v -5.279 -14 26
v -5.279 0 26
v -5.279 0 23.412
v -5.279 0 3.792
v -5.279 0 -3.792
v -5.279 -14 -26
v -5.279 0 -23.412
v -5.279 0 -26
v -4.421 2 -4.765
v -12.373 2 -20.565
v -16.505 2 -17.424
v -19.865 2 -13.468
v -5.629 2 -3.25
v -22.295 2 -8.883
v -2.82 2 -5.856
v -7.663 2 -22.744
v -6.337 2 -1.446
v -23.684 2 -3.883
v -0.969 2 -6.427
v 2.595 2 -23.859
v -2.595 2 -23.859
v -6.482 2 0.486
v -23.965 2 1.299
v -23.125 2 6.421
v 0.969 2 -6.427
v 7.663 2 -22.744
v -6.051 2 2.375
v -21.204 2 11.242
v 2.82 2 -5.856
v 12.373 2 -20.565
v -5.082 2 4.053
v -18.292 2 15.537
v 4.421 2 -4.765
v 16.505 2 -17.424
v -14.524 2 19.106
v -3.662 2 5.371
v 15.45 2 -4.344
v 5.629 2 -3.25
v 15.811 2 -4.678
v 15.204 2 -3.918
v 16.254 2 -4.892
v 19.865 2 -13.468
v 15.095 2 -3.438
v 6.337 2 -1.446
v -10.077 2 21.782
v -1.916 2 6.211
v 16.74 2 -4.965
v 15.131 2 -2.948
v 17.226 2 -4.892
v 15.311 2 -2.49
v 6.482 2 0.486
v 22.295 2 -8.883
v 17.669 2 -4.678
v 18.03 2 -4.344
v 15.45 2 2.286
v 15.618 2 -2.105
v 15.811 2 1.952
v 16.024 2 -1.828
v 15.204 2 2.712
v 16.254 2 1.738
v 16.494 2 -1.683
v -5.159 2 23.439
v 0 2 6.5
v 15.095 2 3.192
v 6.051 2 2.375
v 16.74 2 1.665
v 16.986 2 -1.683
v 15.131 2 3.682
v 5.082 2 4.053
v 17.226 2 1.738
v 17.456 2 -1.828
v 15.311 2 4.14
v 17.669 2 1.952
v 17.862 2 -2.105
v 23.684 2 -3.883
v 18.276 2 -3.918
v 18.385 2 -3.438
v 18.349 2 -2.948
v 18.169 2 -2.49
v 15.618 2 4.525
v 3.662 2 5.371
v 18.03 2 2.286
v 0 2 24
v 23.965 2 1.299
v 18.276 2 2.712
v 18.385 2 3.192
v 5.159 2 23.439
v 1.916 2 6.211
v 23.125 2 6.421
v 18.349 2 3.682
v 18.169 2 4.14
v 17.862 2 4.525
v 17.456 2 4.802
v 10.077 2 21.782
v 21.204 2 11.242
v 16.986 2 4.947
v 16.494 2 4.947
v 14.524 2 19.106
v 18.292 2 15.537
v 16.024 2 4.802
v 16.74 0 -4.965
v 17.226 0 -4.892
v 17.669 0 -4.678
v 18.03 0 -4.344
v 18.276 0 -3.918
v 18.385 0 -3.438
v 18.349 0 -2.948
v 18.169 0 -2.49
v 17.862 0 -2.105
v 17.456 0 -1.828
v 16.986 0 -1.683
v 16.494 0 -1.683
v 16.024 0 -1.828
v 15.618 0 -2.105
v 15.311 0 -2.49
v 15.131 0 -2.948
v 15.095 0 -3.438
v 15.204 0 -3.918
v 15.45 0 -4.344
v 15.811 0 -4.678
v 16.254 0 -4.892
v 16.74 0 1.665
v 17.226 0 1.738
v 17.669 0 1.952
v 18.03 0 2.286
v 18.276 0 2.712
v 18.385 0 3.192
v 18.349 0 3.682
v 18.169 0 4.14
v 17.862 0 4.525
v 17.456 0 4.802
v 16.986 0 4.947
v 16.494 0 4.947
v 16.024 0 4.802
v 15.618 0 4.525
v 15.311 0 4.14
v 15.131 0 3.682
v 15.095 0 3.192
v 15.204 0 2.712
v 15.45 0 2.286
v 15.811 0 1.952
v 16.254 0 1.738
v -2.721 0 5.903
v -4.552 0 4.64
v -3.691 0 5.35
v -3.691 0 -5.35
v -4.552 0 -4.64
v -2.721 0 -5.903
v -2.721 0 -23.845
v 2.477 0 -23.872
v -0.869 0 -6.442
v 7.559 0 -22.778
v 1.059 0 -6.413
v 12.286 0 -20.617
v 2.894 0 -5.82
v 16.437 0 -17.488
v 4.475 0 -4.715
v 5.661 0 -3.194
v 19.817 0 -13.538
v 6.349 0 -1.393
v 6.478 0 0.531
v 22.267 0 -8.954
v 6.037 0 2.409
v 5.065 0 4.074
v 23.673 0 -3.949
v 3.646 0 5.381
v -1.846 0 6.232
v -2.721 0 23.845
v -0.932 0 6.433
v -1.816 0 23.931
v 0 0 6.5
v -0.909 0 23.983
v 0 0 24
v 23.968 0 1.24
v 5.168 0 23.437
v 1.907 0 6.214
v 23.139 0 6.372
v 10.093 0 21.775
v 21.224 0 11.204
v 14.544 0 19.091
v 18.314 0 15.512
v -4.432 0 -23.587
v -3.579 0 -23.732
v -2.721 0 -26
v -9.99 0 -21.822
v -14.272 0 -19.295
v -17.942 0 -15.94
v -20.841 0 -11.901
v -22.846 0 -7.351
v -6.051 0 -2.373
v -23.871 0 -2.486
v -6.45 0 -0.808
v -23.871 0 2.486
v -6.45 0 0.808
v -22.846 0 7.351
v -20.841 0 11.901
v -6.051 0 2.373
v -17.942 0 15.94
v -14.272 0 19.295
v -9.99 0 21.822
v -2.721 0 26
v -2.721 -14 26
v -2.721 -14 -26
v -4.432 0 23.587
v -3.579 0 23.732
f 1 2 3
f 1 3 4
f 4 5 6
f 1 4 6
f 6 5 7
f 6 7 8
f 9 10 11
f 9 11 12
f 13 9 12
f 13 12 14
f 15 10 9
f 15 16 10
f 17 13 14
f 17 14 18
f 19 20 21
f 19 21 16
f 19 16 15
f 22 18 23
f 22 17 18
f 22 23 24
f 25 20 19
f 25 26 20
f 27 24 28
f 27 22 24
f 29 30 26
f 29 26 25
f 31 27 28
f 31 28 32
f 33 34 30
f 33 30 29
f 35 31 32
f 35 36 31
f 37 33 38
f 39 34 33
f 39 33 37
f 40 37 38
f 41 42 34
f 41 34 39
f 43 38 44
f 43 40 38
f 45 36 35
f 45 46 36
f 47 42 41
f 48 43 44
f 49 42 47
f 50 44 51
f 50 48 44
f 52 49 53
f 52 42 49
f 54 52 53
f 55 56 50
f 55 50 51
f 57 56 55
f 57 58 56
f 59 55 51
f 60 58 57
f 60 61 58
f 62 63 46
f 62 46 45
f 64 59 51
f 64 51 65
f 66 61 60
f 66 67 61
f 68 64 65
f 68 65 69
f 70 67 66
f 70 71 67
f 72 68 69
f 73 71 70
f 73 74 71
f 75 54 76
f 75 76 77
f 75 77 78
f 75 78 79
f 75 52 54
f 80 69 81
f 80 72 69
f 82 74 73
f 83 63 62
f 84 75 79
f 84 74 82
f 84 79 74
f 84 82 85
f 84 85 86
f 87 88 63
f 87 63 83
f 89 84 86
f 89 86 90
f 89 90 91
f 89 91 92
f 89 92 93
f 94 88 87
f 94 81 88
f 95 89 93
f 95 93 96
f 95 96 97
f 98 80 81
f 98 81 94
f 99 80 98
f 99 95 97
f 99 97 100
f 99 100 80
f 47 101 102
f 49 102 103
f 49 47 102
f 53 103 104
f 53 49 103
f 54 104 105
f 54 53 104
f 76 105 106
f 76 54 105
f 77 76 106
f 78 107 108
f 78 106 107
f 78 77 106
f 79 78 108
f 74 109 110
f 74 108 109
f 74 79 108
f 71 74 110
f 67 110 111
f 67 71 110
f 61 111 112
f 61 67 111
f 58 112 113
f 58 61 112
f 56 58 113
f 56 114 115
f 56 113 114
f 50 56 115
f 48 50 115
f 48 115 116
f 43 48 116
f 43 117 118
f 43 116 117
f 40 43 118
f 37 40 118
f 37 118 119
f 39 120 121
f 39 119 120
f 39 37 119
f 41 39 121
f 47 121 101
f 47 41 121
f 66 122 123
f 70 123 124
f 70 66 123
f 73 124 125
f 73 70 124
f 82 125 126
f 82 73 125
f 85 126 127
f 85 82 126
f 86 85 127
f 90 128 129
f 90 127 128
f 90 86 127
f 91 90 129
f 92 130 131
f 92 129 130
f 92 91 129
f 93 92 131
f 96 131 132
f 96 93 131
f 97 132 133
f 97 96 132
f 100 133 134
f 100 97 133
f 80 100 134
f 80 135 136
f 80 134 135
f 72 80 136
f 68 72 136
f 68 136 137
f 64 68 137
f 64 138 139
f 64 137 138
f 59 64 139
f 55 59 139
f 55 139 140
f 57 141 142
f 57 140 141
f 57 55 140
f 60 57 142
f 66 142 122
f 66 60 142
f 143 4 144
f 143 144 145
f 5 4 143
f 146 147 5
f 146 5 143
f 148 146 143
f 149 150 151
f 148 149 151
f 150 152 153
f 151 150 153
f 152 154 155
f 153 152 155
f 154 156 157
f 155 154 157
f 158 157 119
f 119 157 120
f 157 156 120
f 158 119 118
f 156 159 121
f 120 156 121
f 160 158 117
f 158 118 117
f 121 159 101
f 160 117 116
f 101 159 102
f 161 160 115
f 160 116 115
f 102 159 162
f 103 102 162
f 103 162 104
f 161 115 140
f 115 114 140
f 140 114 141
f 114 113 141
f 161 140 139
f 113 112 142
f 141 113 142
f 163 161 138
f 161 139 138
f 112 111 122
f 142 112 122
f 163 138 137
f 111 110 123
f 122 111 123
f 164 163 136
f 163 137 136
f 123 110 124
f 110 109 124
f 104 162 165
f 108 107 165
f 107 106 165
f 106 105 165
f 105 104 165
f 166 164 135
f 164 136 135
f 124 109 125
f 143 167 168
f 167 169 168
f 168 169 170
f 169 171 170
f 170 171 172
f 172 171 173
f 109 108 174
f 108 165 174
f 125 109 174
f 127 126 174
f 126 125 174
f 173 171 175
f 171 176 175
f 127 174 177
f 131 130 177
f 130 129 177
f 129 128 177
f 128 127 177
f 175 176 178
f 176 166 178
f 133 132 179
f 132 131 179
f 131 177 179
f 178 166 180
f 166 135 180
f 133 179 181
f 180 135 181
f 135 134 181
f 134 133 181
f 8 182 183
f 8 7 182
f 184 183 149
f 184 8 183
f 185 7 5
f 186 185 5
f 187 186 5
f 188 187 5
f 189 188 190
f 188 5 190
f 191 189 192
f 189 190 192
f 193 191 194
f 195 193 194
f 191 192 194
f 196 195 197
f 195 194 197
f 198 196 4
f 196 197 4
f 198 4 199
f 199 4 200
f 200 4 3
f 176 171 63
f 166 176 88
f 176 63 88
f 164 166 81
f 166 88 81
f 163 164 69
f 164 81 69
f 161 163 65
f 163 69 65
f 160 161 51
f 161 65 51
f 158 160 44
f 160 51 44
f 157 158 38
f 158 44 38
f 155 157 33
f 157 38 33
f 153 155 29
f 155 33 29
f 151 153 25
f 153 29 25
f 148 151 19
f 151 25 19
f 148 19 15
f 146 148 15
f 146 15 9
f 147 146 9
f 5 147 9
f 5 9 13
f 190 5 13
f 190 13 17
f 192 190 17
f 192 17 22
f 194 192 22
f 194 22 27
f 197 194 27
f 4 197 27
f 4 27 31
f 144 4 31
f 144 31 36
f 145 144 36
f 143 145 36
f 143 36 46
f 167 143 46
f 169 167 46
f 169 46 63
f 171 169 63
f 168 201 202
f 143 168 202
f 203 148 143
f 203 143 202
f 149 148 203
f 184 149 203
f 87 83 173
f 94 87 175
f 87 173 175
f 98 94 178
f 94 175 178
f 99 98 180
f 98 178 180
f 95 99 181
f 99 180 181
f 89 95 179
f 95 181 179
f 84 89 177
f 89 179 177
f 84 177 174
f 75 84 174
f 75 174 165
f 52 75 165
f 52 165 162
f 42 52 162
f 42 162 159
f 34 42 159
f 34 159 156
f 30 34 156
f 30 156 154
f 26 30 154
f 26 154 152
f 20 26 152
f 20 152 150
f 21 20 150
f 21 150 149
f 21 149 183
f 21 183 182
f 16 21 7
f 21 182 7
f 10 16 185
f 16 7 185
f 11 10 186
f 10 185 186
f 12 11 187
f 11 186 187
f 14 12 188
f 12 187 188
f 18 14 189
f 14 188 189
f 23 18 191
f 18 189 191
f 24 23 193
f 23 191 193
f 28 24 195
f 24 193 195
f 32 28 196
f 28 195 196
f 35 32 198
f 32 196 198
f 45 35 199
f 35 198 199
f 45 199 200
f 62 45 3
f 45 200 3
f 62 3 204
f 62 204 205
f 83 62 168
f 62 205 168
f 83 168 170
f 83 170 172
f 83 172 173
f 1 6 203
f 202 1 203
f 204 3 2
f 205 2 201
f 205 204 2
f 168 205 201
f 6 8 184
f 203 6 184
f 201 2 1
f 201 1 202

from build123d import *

# Parameters (mm, degrees)
SKETCH1_R           = 24
BOSS_EXTRUDE1_DEPTH = 2
SKETCH6_R           = 6.5
CUT_EXTRUDE4_DEPTH  = 2.4
SKETCH11_R          = 1.65
CUT_EXTRUDE8_DEPTH  = 35
SKETCH12_W          = 2.558537978
SKETCH12_H          = 52
BOSS_EXTRUDE2_DEPTH = 14


with BuildPart() as part:
    # Sketch1 → Boss-Extrude1 (new body)
    with BuildSketch(Plane(origin=(0, 0, 0), x_dir=(1, 0, 0), z_dir=(0, 1, 0))):
        with Locations(Location((0, 0, 0), (0, 0, 270))):
            Circle(SKETCH1_R)
    extrude(amount=BOSS_EXTRUDE1_DEPTH)

    # Sketch6 → Cut-Extrude4 (cut)
    with BuildSketch(Plane(origin=(0, 2, 0), x_dir=(1, 0, 0), z_dir=(0, 1, 0))):
        with Locations(Location((0, 0, 0), (0, 0, 270))):
            Circle(SKETCH6_R)
    extrude(amount=-CUT_EXTRUDE4_DEPTH, mode=Mode.SUBTRACT)

    # Sketch11 → Cut-Extrude8 (cut, through all)
    with BuildSketch(Plane.XZ.offset(-2)):
        with Locations(Location((16.74, 3.315, 0), (0, 0, 270))):
            Circle(SKETCH11_R)
        with Locations(Location((16.74, -3.315, 0), (0, 0, 270))):
            Circle(SKETCH11_R)
    extrude(amount=CUT_EXTRUDE8_DEPTH, mode=Mode.SUBTRACT)

    # Sketch12 → Boss-Extrude2 (add)
    with BuildSketch(Plane(origin=(0, 0, 0), x_dir=(1, 0, 0), z_dir=(0, 1, 0))):
        with Locations((-4, 0)):
            Rectangle(SKETCH12_W, SKETCH12_H)
    extrude(amount=-BOSS_EXTRUDE2_DEPTH)


solid = part.part
